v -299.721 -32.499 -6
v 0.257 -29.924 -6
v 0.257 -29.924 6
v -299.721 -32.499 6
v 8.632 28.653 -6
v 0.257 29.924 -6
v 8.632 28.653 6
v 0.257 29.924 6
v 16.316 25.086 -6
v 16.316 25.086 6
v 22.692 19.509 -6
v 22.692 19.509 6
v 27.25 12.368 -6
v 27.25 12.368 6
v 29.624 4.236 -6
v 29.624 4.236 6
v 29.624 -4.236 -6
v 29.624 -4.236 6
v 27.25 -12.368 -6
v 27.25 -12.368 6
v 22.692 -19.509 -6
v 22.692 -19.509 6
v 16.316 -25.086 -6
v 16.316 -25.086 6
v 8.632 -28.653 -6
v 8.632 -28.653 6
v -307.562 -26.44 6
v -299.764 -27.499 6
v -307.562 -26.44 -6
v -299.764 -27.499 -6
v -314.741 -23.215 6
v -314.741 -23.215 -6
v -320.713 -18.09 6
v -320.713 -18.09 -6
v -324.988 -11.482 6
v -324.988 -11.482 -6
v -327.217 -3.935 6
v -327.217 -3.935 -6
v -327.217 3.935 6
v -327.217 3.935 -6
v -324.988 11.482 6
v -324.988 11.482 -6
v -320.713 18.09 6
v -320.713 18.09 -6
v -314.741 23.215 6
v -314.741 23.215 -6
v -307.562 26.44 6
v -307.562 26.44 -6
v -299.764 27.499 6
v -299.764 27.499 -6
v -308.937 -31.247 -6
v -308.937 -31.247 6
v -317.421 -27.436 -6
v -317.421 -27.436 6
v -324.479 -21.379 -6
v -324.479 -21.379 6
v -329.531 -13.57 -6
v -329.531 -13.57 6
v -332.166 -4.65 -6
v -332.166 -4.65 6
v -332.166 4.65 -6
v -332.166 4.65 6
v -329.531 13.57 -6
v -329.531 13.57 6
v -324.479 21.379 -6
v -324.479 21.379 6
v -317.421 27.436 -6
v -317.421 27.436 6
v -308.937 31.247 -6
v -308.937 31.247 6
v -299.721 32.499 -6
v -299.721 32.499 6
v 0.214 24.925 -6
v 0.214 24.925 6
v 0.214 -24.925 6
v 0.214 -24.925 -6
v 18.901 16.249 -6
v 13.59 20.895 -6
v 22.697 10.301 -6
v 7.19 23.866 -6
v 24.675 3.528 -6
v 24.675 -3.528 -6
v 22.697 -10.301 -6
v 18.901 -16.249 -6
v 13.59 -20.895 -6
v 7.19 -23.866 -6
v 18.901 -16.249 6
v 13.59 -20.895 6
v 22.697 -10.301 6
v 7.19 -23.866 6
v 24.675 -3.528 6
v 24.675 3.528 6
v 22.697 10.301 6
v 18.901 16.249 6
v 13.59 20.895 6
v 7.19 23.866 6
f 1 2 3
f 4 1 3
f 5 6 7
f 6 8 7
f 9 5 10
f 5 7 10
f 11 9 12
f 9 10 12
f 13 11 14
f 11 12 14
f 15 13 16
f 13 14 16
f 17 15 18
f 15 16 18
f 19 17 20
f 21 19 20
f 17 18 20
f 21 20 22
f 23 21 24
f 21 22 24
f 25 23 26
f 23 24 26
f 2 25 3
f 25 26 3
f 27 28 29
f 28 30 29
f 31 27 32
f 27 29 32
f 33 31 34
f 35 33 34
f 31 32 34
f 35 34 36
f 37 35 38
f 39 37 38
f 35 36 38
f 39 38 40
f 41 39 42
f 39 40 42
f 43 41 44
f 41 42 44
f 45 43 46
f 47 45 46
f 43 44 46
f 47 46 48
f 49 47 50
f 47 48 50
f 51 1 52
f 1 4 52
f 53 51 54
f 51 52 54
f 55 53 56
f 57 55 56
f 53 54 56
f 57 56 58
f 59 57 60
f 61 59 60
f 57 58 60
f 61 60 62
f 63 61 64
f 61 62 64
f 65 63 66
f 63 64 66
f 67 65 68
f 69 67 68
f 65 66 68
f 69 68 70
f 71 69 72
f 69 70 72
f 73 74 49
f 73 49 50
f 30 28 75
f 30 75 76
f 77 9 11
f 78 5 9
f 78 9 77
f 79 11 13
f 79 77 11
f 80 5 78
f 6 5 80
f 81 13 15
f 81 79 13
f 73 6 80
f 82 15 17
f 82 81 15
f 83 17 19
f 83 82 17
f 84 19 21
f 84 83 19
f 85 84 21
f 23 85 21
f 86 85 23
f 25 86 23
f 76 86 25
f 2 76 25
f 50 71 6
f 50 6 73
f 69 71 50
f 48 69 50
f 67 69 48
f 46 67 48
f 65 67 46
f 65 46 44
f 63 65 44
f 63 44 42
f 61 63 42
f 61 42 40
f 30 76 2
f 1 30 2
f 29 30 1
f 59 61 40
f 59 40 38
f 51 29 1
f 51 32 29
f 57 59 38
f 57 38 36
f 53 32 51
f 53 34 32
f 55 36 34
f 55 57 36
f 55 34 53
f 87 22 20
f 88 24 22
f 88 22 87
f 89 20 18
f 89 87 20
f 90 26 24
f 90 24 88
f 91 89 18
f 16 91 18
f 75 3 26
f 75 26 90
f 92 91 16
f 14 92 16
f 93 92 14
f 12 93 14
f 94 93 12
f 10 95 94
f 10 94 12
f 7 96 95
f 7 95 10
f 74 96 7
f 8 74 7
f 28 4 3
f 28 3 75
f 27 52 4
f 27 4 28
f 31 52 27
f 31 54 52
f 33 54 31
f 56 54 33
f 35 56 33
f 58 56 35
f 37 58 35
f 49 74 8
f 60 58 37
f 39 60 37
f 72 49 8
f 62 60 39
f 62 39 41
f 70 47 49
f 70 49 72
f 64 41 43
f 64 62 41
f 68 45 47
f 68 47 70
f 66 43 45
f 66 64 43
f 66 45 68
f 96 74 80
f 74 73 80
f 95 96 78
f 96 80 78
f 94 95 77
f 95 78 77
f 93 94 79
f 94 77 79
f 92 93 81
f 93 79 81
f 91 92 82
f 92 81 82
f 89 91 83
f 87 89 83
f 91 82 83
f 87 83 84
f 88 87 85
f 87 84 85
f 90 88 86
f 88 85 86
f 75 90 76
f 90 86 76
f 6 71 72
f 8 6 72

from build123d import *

# Parameters (mm, degrees)
SK_CHAIN_PROFILE_W = 12
SK_CHAIN_PROFILE_H = 5


with BuildPart() as part:
    # FT_Chain_Envelope: sweep along a path in SK_Chain_Path
    with BuildLine(Plane.XY) as ft_chain_envelope_path:
        Line((0.235356499, -27.424490106), (-299.74255, -29.998895305))
        ThreePointArc((-299.74255, -29.998895305), (-330, 0), (-299.74255, 29.998895305))
        Line((-299.74255, 29.998895305), (0.235356499, 27.424490106))
        ThreePointArc((0.235356499, 27.424490106), (27.4255, 0), (0.235356499, -27.424490106))
    # SK_Chain_Profile → FT_Chain_Envelope (sweep)
    with BuildSketch(Plane(origin=(-299.74255, 29.998895305, 0), x_dir=(0, 0, -1), z_dir=(0.9999631768206378, -0.008581666666666639, 0))):
        Rectangle(SK_CHAIN_PROFILE_W, SK_CHAIN_PROFILE_H)
    sweep(path=ft_chain_envelope_path.line)


solid = part.part
